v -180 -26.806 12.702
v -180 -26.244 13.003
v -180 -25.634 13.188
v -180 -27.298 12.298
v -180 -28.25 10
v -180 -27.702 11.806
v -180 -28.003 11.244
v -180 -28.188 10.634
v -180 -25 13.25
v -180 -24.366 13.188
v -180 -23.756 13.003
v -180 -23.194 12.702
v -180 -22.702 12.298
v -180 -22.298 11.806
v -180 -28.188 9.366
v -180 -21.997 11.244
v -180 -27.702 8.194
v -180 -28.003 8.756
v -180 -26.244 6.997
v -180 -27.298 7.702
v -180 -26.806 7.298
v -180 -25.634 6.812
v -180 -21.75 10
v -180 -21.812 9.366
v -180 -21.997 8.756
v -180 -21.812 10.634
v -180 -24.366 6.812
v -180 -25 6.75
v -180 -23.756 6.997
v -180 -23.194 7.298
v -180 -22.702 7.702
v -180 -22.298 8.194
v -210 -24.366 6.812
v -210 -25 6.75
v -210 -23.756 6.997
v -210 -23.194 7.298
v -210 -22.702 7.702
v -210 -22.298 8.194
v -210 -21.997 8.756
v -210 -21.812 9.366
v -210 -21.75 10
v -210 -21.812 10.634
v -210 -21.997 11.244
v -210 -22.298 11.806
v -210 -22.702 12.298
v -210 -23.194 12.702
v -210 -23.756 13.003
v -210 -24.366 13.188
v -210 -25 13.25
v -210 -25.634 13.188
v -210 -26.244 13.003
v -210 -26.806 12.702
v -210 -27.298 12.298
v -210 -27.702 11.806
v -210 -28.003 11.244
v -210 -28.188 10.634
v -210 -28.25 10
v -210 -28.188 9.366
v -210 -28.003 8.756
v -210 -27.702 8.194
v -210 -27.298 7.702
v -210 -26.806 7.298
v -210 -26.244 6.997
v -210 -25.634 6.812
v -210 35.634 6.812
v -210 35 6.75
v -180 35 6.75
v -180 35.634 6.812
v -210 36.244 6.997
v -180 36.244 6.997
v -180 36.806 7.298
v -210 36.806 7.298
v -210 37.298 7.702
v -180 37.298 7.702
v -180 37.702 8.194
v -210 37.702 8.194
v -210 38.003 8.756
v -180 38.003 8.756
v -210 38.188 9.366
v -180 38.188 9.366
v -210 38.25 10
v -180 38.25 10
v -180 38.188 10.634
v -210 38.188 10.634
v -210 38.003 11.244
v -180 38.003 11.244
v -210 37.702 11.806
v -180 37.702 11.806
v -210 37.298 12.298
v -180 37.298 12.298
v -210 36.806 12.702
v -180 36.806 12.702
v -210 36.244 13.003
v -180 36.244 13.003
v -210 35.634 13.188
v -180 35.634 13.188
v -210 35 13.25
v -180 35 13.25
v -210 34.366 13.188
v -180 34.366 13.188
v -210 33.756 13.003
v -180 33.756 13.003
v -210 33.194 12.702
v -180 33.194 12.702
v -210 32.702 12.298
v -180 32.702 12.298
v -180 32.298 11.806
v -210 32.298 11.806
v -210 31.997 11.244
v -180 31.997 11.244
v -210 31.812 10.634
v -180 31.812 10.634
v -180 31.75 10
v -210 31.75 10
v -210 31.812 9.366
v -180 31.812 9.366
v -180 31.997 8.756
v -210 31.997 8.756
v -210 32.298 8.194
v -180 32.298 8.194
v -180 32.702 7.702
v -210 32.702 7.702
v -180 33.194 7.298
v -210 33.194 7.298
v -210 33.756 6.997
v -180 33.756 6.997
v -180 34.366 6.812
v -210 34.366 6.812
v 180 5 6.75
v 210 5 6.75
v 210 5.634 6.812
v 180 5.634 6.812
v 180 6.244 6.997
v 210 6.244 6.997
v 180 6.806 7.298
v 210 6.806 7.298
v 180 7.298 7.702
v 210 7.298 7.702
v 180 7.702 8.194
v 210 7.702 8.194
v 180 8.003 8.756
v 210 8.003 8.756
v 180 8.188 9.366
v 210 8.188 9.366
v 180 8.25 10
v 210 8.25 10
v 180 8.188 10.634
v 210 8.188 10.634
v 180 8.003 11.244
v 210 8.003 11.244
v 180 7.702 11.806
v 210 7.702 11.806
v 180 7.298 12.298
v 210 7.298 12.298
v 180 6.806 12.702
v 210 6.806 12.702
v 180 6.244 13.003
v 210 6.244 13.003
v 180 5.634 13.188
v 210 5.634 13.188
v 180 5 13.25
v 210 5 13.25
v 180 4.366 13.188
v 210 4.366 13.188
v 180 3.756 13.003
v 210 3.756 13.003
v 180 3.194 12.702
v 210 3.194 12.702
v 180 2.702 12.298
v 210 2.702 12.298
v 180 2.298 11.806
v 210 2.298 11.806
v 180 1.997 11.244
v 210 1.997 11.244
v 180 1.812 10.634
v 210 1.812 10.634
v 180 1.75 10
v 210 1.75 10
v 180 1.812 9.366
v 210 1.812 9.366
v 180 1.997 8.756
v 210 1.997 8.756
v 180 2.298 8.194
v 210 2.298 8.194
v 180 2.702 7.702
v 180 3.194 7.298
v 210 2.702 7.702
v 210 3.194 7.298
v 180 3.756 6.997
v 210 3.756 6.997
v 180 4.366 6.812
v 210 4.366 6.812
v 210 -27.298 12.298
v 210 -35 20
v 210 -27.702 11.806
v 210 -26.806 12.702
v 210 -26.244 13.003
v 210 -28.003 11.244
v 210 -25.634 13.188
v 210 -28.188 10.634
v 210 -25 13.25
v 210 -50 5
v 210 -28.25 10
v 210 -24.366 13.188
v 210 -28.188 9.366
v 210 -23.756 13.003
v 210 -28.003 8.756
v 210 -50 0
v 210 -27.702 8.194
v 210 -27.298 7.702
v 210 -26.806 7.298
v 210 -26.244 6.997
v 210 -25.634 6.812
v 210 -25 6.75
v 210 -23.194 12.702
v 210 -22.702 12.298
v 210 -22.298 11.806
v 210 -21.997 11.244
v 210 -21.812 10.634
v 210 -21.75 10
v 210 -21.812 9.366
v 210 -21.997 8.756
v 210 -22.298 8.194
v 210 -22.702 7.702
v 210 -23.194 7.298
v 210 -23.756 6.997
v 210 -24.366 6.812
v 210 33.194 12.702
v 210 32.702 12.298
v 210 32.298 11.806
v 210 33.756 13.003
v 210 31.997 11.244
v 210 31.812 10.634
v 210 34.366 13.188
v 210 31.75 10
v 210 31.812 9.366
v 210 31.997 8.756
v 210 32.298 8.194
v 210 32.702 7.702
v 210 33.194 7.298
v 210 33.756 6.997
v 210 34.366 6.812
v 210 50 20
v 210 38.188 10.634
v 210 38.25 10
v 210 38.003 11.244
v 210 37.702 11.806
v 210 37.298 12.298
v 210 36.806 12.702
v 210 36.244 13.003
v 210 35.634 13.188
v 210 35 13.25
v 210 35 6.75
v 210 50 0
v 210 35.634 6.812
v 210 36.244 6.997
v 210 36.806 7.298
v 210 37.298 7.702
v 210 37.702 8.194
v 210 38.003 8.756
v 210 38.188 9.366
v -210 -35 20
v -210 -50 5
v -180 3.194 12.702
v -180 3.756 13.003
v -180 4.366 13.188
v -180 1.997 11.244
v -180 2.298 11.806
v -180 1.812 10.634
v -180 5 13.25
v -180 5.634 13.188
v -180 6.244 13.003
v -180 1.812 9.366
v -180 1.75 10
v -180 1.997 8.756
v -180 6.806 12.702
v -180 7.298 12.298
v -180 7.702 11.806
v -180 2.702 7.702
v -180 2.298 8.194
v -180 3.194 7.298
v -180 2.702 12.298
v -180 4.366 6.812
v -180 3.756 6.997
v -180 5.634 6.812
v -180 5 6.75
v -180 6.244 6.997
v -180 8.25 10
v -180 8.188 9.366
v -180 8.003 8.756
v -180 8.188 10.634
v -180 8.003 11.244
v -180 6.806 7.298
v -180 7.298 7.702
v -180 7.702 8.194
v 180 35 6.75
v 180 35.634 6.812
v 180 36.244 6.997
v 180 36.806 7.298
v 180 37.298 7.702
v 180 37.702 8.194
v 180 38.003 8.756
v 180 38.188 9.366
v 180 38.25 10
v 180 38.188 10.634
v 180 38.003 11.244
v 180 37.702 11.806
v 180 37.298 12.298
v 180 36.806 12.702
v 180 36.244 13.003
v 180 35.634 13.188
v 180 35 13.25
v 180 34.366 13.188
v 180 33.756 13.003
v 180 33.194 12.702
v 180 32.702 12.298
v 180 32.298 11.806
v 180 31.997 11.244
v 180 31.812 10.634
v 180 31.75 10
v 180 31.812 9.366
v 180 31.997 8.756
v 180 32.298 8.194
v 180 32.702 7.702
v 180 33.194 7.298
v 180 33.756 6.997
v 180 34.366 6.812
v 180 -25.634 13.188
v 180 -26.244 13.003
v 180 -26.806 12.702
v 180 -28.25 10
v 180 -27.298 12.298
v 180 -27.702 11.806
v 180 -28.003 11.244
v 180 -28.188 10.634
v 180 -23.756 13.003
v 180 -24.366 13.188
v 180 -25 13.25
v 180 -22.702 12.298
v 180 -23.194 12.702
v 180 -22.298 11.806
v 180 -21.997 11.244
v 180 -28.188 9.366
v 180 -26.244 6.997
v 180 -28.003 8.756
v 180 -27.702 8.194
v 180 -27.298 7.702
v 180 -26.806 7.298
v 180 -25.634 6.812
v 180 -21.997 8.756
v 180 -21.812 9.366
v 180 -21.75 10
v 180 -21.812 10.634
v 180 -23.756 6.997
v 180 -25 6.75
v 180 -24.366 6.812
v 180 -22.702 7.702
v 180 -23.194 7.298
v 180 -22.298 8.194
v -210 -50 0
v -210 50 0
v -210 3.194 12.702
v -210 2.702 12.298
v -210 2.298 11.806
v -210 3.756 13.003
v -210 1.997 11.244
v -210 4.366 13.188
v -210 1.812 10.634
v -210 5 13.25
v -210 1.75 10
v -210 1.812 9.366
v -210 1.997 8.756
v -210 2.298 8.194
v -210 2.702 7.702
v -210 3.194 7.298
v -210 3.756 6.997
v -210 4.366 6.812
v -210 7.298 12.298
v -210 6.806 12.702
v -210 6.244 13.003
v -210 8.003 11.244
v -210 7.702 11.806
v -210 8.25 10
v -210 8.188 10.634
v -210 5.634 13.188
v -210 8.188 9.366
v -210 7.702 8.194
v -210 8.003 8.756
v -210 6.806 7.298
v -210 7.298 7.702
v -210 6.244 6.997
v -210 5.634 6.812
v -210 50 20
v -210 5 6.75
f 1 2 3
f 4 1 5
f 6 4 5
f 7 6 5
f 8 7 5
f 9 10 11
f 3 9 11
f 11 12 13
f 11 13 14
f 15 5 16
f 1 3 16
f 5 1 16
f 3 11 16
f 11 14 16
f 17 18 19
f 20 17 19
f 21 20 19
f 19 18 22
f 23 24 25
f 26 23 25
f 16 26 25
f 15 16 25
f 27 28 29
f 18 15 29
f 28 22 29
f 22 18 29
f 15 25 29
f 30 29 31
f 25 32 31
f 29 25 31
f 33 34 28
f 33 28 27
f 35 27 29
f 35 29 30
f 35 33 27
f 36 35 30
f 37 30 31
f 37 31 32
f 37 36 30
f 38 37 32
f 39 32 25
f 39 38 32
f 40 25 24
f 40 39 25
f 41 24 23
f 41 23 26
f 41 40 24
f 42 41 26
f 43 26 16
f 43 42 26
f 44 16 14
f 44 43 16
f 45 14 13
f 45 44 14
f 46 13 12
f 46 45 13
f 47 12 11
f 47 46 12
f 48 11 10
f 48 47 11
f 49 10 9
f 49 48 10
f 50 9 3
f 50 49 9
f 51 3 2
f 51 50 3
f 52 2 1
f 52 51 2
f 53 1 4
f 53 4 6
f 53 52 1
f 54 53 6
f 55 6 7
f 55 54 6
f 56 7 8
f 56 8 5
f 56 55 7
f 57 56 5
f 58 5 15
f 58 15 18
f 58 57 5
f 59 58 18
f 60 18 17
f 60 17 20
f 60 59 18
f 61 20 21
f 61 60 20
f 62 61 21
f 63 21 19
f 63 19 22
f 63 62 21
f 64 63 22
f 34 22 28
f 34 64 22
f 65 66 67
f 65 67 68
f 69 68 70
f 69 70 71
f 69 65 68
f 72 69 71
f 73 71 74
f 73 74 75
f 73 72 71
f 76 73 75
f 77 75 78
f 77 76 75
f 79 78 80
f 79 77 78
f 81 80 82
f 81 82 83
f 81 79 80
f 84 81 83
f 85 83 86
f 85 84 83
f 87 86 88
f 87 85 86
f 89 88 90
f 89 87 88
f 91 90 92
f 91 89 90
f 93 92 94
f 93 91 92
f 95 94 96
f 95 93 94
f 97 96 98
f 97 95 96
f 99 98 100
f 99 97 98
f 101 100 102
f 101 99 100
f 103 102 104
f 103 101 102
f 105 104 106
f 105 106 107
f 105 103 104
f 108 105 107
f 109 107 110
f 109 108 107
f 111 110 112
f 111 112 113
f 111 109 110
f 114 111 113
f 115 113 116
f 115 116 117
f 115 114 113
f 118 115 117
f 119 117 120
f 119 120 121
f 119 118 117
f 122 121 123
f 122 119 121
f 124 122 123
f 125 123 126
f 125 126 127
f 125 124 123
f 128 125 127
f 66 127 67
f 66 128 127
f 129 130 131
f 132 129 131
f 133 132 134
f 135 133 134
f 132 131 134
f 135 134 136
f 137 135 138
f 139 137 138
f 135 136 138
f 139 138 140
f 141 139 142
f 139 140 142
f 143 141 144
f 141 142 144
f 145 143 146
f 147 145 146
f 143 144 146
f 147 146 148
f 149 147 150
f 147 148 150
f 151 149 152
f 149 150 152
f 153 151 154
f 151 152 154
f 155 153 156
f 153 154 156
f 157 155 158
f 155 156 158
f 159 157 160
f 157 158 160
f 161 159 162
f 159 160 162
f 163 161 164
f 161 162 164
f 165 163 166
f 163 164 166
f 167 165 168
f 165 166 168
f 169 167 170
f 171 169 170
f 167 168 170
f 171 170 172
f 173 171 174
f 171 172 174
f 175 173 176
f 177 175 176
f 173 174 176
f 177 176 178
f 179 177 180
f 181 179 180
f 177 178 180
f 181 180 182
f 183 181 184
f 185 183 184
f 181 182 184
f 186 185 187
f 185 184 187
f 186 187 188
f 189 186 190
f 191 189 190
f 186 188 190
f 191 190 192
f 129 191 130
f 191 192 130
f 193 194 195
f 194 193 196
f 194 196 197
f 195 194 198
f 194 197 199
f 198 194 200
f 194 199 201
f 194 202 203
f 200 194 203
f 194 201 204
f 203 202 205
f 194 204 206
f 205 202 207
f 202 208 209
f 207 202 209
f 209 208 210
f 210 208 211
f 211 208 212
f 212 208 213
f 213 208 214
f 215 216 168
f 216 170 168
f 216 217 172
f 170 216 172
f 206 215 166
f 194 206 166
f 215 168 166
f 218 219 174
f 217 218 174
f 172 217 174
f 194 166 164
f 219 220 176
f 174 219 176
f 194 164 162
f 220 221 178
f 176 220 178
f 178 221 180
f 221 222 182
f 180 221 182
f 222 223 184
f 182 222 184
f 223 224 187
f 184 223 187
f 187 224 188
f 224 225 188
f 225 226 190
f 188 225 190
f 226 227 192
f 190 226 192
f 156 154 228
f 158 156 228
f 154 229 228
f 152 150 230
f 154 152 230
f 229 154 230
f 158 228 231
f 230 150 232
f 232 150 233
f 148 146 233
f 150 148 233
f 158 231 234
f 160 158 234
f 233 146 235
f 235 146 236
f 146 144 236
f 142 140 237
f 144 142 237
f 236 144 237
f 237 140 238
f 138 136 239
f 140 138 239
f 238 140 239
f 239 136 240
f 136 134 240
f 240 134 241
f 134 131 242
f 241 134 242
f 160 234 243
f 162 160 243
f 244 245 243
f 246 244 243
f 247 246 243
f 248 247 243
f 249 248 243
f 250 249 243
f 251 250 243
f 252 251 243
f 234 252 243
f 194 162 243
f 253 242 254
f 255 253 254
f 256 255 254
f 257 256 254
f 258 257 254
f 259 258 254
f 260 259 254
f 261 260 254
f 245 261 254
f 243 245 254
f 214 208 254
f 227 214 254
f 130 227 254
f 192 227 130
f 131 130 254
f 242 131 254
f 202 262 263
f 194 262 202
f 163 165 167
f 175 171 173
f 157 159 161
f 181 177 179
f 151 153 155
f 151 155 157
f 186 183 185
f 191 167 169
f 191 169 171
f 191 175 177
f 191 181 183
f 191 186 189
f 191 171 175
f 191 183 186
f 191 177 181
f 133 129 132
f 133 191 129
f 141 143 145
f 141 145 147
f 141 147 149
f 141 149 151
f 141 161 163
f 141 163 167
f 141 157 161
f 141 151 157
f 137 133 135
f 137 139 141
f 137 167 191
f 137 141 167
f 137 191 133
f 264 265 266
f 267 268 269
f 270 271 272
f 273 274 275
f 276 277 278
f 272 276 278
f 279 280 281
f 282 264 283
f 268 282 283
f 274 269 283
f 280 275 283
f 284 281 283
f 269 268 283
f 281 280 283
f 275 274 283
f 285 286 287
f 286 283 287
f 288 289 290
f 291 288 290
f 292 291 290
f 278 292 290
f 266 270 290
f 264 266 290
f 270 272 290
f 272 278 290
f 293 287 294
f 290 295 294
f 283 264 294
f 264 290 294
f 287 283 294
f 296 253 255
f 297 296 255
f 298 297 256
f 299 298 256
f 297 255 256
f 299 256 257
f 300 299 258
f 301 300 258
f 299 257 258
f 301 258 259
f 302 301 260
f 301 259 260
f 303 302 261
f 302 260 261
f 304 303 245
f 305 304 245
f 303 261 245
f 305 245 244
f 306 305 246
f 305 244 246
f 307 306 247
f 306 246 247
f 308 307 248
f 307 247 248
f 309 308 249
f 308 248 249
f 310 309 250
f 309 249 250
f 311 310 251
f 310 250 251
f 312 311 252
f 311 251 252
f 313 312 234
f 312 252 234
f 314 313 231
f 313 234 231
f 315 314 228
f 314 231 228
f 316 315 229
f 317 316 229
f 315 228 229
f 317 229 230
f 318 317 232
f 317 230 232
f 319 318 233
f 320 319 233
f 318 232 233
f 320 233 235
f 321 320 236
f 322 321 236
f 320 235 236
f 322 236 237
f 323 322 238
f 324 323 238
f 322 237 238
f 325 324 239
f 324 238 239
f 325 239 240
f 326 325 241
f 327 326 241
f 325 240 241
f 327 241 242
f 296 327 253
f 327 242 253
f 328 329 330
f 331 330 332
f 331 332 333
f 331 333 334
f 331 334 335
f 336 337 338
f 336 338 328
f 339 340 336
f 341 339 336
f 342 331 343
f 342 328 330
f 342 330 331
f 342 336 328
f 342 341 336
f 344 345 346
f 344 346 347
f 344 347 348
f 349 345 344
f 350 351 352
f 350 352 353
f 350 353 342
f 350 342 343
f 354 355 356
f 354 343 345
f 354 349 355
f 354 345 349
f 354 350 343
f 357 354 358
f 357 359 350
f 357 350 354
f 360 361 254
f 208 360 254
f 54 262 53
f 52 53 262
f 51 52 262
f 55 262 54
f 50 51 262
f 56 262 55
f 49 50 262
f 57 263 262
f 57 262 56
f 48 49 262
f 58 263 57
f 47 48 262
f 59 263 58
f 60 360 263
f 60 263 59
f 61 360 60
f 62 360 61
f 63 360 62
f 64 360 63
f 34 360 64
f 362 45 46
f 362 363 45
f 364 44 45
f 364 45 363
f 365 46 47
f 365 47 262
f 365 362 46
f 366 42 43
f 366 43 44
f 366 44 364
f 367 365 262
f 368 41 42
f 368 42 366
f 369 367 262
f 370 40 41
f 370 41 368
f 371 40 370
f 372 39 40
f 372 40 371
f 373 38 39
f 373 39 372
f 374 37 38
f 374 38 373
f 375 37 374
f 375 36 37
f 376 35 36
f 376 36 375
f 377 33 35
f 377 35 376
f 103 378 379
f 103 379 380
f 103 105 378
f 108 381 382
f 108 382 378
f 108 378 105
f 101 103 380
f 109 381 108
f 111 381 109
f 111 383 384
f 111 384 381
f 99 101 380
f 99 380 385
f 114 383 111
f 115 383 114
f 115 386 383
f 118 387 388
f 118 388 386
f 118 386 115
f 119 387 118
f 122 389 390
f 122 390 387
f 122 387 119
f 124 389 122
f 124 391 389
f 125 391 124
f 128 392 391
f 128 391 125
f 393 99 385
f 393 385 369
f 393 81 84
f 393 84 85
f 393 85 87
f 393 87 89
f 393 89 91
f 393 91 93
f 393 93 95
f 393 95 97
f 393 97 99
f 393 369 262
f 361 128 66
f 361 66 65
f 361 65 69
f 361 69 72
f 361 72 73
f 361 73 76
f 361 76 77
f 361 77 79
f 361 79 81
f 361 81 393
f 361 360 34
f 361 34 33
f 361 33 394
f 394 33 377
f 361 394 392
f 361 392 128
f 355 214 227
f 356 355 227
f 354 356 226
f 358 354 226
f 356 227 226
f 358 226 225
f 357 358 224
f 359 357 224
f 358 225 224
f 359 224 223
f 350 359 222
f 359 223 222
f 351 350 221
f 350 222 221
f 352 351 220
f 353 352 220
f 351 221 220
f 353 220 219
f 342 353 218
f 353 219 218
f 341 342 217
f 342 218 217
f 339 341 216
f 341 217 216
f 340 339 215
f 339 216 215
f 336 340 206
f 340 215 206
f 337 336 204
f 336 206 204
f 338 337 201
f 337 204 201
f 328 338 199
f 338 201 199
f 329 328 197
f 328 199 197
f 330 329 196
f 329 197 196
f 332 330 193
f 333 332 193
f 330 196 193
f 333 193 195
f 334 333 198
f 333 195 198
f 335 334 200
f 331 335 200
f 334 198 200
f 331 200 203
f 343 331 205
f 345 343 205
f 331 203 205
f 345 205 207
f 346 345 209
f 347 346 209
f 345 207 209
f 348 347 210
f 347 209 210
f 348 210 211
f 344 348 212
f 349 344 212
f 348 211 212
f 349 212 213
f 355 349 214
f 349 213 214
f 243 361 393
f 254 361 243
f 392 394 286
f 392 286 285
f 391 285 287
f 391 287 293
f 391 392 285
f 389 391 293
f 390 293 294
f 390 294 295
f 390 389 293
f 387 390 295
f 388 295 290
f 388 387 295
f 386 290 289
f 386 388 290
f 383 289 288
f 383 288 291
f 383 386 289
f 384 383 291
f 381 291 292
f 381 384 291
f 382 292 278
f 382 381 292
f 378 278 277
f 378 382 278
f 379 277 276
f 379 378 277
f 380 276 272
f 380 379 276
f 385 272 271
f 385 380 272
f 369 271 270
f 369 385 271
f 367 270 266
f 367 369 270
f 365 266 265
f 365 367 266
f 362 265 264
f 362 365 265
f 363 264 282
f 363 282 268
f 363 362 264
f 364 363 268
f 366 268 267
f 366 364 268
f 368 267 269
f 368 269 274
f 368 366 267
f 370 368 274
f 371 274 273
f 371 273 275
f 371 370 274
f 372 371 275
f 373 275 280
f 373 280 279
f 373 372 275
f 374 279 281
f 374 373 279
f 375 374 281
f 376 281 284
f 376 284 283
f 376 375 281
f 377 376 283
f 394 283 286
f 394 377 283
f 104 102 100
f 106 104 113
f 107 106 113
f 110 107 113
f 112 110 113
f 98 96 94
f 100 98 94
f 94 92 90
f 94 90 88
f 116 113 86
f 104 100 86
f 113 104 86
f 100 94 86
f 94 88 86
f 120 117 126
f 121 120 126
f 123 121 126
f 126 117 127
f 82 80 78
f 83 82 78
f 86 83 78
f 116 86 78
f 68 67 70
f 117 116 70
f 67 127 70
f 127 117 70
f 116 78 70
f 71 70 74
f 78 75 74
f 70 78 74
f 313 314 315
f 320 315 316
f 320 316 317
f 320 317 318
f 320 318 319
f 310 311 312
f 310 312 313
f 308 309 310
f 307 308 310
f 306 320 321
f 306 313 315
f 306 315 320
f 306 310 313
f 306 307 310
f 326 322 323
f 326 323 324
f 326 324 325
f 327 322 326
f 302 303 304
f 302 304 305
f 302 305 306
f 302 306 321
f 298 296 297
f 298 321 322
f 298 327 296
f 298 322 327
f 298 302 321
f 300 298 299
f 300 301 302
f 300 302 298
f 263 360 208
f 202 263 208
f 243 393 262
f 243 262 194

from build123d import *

# Parameters (mm, degrees)
IZIM1_W                     = 420
IZIM1_H                     = 100
Y_KSEKLIK_EKSTR_ZYON1_DEPTH = 20
PAH1_SIZE                   = 15
IZIM2_R                     = 3.25
KES_EKSTR_ZYON1_DEPTH       = 30


with BuildPart() as part:
    # Çizim1 → Yükseklik-Ekstrüzyon1 (new body)
    with BuildSketch(Plane.XY):
        Rectangle(IZIM1_W, IZIM1_H)
    extrude(amount=Y_KSEKLIK_EKSTR_ZYON1_DEPTH)

    # Pah1
    pah1_edges = [part.edges().sort_by_distance(p)[0] for p in [
        (0, -50, 20),
    ]]
    chamfer(pah1_edges, length=PAH1_SIZE)

    # Çizim2 → Kes-Ekstrüzyon1 (cut)
    with BuildSketch(Plane(origin=(210, 0, 0), x_dir=(0, 0, -1), z_dir=(1, 0, 0))):
        with Locations((-10, 35)):
            Circle(IZIM2_R)
        with Locations((-10, 5)):
            Circle(IZIM2_R)
        with Locations((-10, -25)):
            Circle(IZIM2_R)
    kes_ekstr_zyon1 = extrude(amount=-KES_EKSTR_ZYON1_DEPTH, mode=Mode.SUBTRACT)

    # Aynalama1: Kes-Ekstrüzyon1 across plane
    add(kes_ekstr_zyon1.mirror(Plane(origin=(0, 0, 0), x_dir=(0, 0, 1), z_dir=(1, 0, 0))), mode=Mode.SUBTRACT)


solid = part.part
